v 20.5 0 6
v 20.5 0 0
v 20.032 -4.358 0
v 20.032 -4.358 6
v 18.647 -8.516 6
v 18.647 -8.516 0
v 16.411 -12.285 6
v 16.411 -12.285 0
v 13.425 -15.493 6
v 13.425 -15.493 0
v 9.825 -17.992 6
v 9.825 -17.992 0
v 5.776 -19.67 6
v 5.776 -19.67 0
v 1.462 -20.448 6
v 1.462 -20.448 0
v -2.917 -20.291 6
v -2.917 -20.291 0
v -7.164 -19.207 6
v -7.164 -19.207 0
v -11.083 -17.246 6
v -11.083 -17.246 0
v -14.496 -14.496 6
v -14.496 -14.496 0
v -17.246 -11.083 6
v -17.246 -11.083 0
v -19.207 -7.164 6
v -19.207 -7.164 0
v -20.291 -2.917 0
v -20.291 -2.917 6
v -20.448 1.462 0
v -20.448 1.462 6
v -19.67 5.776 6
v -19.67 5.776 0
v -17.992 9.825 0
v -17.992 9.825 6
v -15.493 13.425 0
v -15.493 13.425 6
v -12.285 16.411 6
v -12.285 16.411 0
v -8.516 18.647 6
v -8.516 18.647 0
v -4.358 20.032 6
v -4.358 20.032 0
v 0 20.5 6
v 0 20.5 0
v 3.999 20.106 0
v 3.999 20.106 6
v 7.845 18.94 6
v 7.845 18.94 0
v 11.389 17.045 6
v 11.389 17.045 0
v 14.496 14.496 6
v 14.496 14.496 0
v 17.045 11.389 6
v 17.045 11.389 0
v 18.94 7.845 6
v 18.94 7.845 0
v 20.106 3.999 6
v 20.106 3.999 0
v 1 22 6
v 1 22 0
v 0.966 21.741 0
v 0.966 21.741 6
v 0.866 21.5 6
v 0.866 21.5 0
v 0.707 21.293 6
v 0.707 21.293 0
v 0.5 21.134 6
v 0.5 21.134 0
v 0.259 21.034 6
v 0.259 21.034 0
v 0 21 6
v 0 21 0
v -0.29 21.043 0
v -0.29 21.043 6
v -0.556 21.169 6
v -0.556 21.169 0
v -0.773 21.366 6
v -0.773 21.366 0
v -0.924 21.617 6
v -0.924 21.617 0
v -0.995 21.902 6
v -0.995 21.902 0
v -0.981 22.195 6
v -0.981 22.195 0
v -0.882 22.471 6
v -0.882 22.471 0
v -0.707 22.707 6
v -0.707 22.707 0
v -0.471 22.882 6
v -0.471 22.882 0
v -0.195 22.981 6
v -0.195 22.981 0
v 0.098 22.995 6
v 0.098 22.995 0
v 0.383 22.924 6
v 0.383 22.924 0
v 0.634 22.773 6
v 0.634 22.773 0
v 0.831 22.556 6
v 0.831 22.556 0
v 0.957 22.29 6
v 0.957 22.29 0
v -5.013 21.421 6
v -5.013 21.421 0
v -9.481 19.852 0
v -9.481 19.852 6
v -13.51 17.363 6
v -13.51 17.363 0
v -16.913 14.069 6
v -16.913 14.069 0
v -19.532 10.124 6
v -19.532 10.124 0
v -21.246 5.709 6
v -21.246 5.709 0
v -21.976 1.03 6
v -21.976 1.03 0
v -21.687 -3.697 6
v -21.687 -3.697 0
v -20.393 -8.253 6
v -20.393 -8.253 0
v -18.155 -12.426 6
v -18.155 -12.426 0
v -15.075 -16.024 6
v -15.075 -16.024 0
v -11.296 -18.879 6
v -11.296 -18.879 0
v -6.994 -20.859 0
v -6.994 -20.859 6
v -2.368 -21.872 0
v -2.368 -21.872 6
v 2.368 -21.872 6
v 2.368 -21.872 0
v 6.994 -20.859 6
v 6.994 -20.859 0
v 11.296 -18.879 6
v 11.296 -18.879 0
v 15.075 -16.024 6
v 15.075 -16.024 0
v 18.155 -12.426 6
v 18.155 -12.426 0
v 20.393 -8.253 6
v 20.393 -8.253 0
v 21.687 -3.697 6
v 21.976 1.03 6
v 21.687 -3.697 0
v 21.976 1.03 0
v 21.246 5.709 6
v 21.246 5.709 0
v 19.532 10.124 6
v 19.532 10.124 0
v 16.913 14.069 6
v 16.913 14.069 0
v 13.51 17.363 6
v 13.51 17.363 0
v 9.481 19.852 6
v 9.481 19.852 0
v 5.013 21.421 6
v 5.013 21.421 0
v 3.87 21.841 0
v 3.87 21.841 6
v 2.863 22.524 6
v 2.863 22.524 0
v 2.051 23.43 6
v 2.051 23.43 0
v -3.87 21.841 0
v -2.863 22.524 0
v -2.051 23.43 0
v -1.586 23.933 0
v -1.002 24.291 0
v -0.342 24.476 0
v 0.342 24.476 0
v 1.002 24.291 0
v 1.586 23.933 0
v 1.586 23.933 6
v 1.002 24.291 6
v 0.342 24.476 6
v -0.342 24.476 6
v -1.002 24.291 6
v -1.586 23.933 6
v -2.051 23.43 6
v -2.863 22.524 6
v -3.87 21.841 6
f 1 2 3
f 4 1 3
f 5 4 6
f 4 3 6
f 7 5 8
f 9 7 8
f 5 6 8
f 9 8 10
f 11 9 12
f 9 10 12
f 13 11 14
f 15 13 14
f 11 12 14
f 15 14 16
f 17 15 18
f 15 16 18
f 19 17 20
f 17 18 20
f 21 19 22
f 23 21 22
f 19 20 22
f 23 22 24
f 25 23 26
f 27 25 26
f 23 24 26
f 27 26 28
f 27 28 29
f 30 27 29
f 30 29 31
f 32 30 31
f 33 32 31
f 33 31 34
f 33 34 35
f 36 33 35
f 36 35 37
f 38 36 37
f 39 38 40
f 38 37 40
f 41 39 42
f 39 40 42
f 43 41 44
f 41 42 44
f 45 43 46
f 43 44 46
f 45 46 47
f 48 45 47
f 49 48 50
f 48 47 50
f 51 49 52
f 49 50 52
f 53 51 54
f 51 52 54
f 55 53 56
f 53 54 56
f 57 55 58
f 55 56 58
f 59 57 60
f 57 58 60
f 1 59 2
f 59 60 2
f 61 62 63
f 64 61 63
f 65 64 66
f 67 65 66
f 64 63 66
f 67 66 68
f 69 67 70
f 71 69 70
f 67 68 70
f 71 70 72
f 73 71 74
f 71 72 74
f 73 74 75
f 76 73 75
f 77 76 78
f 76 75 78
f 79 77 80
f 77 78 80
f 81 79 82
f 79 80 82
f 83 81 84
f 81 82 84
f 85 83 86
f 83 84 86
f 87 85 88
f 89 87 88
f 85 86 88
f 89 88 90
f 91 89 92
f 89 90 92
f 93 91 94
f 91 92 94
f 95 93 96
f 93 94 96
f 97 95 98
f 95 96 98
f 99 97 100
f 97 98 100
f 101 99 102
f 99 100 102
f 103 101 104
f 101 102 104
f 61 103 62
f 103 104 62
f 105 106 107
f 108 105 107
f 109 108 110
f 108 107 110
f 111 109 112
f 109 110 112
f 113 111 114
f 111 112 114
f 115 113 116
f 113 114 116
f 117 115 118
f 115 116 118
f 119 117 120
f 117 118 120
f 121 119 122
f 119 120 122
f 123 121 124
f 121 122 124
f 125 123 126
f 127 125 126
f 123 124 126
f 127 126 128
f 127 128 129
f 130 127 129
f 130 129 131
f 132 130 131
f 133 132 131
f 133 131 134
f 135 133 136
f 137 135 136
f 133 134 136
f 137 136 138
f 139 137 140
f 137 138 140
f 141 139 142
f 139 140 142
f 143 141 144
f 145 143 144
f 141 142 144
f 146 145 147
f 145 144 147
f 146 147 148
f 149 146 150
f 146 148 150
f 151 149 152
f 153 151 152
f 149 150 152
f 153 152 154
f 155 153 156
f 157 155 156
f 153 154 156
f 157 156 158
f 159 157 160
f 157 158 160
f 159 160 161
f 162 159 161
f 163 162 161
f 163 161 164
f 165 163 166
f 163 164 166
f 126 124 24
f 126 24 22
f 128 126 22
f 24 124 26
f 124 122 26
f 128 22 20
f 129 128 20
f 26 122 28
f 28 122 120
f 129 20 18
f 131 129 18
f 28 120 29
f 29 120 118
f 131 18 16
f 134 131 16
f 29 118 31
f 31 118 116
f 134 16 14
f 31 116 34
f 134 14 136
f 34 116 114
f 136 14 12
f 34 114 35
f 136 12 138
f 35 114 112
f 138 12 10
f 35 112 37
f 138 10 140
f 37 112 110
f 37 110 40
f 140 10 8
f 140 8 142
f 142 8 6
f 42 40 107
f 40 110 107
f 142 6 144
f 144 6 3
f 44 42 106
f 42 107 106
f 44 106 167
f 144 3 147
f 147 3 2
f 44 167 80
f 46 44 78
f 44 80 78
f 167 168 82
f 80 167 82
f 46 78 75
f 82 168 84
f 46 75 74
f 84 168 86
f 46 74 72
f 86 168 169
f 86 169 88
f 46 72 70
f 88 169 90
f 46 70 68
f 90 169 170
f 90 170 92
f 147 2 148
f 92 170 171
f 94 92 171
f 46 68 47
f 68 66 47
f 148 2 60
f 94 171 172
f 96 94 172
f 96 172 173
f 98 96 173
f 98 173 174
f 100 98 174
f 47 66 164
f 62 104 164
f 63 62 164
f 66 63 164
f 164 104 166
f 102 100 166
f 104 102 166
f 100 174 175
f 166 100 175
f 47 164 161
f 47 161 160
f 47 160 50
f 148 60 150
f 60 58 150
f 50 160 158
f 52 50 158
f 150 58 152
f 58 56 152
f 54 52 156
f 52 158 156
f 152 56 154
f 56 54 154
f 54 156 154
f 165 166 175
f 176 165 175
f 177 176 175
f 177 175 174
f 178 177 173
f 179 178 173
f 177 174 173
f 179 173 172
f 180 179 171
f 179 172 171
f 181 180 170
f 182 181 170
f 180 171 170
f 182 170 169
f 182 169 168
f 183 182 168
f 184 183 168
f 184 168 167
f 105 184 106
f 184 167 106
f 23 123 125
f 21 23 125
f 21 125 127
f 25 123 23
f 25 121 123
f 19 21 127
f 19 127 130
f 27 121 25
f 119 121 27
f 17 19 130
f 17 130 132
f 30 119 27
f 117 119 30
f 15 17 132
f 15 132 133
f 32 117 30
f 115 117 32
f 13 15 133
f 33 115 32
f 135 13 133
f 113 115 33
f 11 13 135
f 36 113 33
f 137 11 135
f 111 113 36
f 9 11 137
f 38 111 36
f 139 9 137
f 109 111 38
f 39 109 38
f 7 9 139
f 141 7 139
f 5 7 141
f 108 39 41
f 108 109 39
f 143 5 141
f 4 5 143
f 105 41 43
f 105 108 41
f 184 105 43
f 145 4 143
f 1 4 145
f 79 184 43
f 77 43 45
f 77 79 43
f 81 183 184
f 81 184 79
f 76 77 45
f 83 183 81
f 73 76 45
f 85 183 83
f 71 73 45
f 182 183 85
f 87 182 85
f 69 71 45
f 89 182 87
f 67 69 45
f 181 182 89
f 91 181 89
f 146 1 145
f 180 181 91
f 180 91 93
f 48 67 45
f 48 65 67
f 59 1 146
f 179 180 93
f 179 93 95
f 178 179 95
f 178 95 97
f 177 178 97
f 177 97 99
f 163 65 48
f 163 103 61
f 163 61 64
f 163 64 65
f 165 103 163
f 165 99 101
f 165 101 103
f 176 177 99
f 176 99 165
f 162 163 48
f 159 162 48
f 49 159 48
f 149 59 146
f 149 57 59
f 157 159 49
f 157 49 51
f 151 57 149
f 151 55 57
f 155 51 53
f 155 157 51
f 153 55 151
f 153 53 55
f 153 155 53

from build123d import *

# Parameters (mm, degrees)
F1_DEPTH = 6


with BuildPart() as f1:
    # F0 (on Top) → F1 (new body)
    with BuildSketch(Plane.XY):
        with BuildLine():
            ThreePointArc((-2.050687, 23.429924), (-3.345865, 22.151504), (-5.01279, 21.421296))
            ThreePointArc((-5.01279, 21.421296), (0, -22), (5.01279, 21.421296))
            ThreePointArc((5.01279, 21.421296), (3.345865, 22.151504), (2.050687, 23.429924))
            ThreePointArc((2.050687, 23.429924), (0, 24.5), (-2.050687, 23.429924))
        make_face()
        with BuildLine():
            ThreePointArc((0, 20.5), (14.495689, 14.495689), (20.5, 0))
            ThreePointArc((20.5, 0), (-14.495689, -14.495689), (0, 20.5))
        make_face(mode=Mode.SUBTRACT)
        with BuildLine():
            ThreePointArc((1, 22), (0.707107, 21.292893), (0, 21))
            ThreePointArc((0, 21), (-0.707107, 22.707107), (1, 22))
        make_face(mode=Mode.SUBTRACT)
    extrude(amount=F1_DEPTH)


solid = f1.part
